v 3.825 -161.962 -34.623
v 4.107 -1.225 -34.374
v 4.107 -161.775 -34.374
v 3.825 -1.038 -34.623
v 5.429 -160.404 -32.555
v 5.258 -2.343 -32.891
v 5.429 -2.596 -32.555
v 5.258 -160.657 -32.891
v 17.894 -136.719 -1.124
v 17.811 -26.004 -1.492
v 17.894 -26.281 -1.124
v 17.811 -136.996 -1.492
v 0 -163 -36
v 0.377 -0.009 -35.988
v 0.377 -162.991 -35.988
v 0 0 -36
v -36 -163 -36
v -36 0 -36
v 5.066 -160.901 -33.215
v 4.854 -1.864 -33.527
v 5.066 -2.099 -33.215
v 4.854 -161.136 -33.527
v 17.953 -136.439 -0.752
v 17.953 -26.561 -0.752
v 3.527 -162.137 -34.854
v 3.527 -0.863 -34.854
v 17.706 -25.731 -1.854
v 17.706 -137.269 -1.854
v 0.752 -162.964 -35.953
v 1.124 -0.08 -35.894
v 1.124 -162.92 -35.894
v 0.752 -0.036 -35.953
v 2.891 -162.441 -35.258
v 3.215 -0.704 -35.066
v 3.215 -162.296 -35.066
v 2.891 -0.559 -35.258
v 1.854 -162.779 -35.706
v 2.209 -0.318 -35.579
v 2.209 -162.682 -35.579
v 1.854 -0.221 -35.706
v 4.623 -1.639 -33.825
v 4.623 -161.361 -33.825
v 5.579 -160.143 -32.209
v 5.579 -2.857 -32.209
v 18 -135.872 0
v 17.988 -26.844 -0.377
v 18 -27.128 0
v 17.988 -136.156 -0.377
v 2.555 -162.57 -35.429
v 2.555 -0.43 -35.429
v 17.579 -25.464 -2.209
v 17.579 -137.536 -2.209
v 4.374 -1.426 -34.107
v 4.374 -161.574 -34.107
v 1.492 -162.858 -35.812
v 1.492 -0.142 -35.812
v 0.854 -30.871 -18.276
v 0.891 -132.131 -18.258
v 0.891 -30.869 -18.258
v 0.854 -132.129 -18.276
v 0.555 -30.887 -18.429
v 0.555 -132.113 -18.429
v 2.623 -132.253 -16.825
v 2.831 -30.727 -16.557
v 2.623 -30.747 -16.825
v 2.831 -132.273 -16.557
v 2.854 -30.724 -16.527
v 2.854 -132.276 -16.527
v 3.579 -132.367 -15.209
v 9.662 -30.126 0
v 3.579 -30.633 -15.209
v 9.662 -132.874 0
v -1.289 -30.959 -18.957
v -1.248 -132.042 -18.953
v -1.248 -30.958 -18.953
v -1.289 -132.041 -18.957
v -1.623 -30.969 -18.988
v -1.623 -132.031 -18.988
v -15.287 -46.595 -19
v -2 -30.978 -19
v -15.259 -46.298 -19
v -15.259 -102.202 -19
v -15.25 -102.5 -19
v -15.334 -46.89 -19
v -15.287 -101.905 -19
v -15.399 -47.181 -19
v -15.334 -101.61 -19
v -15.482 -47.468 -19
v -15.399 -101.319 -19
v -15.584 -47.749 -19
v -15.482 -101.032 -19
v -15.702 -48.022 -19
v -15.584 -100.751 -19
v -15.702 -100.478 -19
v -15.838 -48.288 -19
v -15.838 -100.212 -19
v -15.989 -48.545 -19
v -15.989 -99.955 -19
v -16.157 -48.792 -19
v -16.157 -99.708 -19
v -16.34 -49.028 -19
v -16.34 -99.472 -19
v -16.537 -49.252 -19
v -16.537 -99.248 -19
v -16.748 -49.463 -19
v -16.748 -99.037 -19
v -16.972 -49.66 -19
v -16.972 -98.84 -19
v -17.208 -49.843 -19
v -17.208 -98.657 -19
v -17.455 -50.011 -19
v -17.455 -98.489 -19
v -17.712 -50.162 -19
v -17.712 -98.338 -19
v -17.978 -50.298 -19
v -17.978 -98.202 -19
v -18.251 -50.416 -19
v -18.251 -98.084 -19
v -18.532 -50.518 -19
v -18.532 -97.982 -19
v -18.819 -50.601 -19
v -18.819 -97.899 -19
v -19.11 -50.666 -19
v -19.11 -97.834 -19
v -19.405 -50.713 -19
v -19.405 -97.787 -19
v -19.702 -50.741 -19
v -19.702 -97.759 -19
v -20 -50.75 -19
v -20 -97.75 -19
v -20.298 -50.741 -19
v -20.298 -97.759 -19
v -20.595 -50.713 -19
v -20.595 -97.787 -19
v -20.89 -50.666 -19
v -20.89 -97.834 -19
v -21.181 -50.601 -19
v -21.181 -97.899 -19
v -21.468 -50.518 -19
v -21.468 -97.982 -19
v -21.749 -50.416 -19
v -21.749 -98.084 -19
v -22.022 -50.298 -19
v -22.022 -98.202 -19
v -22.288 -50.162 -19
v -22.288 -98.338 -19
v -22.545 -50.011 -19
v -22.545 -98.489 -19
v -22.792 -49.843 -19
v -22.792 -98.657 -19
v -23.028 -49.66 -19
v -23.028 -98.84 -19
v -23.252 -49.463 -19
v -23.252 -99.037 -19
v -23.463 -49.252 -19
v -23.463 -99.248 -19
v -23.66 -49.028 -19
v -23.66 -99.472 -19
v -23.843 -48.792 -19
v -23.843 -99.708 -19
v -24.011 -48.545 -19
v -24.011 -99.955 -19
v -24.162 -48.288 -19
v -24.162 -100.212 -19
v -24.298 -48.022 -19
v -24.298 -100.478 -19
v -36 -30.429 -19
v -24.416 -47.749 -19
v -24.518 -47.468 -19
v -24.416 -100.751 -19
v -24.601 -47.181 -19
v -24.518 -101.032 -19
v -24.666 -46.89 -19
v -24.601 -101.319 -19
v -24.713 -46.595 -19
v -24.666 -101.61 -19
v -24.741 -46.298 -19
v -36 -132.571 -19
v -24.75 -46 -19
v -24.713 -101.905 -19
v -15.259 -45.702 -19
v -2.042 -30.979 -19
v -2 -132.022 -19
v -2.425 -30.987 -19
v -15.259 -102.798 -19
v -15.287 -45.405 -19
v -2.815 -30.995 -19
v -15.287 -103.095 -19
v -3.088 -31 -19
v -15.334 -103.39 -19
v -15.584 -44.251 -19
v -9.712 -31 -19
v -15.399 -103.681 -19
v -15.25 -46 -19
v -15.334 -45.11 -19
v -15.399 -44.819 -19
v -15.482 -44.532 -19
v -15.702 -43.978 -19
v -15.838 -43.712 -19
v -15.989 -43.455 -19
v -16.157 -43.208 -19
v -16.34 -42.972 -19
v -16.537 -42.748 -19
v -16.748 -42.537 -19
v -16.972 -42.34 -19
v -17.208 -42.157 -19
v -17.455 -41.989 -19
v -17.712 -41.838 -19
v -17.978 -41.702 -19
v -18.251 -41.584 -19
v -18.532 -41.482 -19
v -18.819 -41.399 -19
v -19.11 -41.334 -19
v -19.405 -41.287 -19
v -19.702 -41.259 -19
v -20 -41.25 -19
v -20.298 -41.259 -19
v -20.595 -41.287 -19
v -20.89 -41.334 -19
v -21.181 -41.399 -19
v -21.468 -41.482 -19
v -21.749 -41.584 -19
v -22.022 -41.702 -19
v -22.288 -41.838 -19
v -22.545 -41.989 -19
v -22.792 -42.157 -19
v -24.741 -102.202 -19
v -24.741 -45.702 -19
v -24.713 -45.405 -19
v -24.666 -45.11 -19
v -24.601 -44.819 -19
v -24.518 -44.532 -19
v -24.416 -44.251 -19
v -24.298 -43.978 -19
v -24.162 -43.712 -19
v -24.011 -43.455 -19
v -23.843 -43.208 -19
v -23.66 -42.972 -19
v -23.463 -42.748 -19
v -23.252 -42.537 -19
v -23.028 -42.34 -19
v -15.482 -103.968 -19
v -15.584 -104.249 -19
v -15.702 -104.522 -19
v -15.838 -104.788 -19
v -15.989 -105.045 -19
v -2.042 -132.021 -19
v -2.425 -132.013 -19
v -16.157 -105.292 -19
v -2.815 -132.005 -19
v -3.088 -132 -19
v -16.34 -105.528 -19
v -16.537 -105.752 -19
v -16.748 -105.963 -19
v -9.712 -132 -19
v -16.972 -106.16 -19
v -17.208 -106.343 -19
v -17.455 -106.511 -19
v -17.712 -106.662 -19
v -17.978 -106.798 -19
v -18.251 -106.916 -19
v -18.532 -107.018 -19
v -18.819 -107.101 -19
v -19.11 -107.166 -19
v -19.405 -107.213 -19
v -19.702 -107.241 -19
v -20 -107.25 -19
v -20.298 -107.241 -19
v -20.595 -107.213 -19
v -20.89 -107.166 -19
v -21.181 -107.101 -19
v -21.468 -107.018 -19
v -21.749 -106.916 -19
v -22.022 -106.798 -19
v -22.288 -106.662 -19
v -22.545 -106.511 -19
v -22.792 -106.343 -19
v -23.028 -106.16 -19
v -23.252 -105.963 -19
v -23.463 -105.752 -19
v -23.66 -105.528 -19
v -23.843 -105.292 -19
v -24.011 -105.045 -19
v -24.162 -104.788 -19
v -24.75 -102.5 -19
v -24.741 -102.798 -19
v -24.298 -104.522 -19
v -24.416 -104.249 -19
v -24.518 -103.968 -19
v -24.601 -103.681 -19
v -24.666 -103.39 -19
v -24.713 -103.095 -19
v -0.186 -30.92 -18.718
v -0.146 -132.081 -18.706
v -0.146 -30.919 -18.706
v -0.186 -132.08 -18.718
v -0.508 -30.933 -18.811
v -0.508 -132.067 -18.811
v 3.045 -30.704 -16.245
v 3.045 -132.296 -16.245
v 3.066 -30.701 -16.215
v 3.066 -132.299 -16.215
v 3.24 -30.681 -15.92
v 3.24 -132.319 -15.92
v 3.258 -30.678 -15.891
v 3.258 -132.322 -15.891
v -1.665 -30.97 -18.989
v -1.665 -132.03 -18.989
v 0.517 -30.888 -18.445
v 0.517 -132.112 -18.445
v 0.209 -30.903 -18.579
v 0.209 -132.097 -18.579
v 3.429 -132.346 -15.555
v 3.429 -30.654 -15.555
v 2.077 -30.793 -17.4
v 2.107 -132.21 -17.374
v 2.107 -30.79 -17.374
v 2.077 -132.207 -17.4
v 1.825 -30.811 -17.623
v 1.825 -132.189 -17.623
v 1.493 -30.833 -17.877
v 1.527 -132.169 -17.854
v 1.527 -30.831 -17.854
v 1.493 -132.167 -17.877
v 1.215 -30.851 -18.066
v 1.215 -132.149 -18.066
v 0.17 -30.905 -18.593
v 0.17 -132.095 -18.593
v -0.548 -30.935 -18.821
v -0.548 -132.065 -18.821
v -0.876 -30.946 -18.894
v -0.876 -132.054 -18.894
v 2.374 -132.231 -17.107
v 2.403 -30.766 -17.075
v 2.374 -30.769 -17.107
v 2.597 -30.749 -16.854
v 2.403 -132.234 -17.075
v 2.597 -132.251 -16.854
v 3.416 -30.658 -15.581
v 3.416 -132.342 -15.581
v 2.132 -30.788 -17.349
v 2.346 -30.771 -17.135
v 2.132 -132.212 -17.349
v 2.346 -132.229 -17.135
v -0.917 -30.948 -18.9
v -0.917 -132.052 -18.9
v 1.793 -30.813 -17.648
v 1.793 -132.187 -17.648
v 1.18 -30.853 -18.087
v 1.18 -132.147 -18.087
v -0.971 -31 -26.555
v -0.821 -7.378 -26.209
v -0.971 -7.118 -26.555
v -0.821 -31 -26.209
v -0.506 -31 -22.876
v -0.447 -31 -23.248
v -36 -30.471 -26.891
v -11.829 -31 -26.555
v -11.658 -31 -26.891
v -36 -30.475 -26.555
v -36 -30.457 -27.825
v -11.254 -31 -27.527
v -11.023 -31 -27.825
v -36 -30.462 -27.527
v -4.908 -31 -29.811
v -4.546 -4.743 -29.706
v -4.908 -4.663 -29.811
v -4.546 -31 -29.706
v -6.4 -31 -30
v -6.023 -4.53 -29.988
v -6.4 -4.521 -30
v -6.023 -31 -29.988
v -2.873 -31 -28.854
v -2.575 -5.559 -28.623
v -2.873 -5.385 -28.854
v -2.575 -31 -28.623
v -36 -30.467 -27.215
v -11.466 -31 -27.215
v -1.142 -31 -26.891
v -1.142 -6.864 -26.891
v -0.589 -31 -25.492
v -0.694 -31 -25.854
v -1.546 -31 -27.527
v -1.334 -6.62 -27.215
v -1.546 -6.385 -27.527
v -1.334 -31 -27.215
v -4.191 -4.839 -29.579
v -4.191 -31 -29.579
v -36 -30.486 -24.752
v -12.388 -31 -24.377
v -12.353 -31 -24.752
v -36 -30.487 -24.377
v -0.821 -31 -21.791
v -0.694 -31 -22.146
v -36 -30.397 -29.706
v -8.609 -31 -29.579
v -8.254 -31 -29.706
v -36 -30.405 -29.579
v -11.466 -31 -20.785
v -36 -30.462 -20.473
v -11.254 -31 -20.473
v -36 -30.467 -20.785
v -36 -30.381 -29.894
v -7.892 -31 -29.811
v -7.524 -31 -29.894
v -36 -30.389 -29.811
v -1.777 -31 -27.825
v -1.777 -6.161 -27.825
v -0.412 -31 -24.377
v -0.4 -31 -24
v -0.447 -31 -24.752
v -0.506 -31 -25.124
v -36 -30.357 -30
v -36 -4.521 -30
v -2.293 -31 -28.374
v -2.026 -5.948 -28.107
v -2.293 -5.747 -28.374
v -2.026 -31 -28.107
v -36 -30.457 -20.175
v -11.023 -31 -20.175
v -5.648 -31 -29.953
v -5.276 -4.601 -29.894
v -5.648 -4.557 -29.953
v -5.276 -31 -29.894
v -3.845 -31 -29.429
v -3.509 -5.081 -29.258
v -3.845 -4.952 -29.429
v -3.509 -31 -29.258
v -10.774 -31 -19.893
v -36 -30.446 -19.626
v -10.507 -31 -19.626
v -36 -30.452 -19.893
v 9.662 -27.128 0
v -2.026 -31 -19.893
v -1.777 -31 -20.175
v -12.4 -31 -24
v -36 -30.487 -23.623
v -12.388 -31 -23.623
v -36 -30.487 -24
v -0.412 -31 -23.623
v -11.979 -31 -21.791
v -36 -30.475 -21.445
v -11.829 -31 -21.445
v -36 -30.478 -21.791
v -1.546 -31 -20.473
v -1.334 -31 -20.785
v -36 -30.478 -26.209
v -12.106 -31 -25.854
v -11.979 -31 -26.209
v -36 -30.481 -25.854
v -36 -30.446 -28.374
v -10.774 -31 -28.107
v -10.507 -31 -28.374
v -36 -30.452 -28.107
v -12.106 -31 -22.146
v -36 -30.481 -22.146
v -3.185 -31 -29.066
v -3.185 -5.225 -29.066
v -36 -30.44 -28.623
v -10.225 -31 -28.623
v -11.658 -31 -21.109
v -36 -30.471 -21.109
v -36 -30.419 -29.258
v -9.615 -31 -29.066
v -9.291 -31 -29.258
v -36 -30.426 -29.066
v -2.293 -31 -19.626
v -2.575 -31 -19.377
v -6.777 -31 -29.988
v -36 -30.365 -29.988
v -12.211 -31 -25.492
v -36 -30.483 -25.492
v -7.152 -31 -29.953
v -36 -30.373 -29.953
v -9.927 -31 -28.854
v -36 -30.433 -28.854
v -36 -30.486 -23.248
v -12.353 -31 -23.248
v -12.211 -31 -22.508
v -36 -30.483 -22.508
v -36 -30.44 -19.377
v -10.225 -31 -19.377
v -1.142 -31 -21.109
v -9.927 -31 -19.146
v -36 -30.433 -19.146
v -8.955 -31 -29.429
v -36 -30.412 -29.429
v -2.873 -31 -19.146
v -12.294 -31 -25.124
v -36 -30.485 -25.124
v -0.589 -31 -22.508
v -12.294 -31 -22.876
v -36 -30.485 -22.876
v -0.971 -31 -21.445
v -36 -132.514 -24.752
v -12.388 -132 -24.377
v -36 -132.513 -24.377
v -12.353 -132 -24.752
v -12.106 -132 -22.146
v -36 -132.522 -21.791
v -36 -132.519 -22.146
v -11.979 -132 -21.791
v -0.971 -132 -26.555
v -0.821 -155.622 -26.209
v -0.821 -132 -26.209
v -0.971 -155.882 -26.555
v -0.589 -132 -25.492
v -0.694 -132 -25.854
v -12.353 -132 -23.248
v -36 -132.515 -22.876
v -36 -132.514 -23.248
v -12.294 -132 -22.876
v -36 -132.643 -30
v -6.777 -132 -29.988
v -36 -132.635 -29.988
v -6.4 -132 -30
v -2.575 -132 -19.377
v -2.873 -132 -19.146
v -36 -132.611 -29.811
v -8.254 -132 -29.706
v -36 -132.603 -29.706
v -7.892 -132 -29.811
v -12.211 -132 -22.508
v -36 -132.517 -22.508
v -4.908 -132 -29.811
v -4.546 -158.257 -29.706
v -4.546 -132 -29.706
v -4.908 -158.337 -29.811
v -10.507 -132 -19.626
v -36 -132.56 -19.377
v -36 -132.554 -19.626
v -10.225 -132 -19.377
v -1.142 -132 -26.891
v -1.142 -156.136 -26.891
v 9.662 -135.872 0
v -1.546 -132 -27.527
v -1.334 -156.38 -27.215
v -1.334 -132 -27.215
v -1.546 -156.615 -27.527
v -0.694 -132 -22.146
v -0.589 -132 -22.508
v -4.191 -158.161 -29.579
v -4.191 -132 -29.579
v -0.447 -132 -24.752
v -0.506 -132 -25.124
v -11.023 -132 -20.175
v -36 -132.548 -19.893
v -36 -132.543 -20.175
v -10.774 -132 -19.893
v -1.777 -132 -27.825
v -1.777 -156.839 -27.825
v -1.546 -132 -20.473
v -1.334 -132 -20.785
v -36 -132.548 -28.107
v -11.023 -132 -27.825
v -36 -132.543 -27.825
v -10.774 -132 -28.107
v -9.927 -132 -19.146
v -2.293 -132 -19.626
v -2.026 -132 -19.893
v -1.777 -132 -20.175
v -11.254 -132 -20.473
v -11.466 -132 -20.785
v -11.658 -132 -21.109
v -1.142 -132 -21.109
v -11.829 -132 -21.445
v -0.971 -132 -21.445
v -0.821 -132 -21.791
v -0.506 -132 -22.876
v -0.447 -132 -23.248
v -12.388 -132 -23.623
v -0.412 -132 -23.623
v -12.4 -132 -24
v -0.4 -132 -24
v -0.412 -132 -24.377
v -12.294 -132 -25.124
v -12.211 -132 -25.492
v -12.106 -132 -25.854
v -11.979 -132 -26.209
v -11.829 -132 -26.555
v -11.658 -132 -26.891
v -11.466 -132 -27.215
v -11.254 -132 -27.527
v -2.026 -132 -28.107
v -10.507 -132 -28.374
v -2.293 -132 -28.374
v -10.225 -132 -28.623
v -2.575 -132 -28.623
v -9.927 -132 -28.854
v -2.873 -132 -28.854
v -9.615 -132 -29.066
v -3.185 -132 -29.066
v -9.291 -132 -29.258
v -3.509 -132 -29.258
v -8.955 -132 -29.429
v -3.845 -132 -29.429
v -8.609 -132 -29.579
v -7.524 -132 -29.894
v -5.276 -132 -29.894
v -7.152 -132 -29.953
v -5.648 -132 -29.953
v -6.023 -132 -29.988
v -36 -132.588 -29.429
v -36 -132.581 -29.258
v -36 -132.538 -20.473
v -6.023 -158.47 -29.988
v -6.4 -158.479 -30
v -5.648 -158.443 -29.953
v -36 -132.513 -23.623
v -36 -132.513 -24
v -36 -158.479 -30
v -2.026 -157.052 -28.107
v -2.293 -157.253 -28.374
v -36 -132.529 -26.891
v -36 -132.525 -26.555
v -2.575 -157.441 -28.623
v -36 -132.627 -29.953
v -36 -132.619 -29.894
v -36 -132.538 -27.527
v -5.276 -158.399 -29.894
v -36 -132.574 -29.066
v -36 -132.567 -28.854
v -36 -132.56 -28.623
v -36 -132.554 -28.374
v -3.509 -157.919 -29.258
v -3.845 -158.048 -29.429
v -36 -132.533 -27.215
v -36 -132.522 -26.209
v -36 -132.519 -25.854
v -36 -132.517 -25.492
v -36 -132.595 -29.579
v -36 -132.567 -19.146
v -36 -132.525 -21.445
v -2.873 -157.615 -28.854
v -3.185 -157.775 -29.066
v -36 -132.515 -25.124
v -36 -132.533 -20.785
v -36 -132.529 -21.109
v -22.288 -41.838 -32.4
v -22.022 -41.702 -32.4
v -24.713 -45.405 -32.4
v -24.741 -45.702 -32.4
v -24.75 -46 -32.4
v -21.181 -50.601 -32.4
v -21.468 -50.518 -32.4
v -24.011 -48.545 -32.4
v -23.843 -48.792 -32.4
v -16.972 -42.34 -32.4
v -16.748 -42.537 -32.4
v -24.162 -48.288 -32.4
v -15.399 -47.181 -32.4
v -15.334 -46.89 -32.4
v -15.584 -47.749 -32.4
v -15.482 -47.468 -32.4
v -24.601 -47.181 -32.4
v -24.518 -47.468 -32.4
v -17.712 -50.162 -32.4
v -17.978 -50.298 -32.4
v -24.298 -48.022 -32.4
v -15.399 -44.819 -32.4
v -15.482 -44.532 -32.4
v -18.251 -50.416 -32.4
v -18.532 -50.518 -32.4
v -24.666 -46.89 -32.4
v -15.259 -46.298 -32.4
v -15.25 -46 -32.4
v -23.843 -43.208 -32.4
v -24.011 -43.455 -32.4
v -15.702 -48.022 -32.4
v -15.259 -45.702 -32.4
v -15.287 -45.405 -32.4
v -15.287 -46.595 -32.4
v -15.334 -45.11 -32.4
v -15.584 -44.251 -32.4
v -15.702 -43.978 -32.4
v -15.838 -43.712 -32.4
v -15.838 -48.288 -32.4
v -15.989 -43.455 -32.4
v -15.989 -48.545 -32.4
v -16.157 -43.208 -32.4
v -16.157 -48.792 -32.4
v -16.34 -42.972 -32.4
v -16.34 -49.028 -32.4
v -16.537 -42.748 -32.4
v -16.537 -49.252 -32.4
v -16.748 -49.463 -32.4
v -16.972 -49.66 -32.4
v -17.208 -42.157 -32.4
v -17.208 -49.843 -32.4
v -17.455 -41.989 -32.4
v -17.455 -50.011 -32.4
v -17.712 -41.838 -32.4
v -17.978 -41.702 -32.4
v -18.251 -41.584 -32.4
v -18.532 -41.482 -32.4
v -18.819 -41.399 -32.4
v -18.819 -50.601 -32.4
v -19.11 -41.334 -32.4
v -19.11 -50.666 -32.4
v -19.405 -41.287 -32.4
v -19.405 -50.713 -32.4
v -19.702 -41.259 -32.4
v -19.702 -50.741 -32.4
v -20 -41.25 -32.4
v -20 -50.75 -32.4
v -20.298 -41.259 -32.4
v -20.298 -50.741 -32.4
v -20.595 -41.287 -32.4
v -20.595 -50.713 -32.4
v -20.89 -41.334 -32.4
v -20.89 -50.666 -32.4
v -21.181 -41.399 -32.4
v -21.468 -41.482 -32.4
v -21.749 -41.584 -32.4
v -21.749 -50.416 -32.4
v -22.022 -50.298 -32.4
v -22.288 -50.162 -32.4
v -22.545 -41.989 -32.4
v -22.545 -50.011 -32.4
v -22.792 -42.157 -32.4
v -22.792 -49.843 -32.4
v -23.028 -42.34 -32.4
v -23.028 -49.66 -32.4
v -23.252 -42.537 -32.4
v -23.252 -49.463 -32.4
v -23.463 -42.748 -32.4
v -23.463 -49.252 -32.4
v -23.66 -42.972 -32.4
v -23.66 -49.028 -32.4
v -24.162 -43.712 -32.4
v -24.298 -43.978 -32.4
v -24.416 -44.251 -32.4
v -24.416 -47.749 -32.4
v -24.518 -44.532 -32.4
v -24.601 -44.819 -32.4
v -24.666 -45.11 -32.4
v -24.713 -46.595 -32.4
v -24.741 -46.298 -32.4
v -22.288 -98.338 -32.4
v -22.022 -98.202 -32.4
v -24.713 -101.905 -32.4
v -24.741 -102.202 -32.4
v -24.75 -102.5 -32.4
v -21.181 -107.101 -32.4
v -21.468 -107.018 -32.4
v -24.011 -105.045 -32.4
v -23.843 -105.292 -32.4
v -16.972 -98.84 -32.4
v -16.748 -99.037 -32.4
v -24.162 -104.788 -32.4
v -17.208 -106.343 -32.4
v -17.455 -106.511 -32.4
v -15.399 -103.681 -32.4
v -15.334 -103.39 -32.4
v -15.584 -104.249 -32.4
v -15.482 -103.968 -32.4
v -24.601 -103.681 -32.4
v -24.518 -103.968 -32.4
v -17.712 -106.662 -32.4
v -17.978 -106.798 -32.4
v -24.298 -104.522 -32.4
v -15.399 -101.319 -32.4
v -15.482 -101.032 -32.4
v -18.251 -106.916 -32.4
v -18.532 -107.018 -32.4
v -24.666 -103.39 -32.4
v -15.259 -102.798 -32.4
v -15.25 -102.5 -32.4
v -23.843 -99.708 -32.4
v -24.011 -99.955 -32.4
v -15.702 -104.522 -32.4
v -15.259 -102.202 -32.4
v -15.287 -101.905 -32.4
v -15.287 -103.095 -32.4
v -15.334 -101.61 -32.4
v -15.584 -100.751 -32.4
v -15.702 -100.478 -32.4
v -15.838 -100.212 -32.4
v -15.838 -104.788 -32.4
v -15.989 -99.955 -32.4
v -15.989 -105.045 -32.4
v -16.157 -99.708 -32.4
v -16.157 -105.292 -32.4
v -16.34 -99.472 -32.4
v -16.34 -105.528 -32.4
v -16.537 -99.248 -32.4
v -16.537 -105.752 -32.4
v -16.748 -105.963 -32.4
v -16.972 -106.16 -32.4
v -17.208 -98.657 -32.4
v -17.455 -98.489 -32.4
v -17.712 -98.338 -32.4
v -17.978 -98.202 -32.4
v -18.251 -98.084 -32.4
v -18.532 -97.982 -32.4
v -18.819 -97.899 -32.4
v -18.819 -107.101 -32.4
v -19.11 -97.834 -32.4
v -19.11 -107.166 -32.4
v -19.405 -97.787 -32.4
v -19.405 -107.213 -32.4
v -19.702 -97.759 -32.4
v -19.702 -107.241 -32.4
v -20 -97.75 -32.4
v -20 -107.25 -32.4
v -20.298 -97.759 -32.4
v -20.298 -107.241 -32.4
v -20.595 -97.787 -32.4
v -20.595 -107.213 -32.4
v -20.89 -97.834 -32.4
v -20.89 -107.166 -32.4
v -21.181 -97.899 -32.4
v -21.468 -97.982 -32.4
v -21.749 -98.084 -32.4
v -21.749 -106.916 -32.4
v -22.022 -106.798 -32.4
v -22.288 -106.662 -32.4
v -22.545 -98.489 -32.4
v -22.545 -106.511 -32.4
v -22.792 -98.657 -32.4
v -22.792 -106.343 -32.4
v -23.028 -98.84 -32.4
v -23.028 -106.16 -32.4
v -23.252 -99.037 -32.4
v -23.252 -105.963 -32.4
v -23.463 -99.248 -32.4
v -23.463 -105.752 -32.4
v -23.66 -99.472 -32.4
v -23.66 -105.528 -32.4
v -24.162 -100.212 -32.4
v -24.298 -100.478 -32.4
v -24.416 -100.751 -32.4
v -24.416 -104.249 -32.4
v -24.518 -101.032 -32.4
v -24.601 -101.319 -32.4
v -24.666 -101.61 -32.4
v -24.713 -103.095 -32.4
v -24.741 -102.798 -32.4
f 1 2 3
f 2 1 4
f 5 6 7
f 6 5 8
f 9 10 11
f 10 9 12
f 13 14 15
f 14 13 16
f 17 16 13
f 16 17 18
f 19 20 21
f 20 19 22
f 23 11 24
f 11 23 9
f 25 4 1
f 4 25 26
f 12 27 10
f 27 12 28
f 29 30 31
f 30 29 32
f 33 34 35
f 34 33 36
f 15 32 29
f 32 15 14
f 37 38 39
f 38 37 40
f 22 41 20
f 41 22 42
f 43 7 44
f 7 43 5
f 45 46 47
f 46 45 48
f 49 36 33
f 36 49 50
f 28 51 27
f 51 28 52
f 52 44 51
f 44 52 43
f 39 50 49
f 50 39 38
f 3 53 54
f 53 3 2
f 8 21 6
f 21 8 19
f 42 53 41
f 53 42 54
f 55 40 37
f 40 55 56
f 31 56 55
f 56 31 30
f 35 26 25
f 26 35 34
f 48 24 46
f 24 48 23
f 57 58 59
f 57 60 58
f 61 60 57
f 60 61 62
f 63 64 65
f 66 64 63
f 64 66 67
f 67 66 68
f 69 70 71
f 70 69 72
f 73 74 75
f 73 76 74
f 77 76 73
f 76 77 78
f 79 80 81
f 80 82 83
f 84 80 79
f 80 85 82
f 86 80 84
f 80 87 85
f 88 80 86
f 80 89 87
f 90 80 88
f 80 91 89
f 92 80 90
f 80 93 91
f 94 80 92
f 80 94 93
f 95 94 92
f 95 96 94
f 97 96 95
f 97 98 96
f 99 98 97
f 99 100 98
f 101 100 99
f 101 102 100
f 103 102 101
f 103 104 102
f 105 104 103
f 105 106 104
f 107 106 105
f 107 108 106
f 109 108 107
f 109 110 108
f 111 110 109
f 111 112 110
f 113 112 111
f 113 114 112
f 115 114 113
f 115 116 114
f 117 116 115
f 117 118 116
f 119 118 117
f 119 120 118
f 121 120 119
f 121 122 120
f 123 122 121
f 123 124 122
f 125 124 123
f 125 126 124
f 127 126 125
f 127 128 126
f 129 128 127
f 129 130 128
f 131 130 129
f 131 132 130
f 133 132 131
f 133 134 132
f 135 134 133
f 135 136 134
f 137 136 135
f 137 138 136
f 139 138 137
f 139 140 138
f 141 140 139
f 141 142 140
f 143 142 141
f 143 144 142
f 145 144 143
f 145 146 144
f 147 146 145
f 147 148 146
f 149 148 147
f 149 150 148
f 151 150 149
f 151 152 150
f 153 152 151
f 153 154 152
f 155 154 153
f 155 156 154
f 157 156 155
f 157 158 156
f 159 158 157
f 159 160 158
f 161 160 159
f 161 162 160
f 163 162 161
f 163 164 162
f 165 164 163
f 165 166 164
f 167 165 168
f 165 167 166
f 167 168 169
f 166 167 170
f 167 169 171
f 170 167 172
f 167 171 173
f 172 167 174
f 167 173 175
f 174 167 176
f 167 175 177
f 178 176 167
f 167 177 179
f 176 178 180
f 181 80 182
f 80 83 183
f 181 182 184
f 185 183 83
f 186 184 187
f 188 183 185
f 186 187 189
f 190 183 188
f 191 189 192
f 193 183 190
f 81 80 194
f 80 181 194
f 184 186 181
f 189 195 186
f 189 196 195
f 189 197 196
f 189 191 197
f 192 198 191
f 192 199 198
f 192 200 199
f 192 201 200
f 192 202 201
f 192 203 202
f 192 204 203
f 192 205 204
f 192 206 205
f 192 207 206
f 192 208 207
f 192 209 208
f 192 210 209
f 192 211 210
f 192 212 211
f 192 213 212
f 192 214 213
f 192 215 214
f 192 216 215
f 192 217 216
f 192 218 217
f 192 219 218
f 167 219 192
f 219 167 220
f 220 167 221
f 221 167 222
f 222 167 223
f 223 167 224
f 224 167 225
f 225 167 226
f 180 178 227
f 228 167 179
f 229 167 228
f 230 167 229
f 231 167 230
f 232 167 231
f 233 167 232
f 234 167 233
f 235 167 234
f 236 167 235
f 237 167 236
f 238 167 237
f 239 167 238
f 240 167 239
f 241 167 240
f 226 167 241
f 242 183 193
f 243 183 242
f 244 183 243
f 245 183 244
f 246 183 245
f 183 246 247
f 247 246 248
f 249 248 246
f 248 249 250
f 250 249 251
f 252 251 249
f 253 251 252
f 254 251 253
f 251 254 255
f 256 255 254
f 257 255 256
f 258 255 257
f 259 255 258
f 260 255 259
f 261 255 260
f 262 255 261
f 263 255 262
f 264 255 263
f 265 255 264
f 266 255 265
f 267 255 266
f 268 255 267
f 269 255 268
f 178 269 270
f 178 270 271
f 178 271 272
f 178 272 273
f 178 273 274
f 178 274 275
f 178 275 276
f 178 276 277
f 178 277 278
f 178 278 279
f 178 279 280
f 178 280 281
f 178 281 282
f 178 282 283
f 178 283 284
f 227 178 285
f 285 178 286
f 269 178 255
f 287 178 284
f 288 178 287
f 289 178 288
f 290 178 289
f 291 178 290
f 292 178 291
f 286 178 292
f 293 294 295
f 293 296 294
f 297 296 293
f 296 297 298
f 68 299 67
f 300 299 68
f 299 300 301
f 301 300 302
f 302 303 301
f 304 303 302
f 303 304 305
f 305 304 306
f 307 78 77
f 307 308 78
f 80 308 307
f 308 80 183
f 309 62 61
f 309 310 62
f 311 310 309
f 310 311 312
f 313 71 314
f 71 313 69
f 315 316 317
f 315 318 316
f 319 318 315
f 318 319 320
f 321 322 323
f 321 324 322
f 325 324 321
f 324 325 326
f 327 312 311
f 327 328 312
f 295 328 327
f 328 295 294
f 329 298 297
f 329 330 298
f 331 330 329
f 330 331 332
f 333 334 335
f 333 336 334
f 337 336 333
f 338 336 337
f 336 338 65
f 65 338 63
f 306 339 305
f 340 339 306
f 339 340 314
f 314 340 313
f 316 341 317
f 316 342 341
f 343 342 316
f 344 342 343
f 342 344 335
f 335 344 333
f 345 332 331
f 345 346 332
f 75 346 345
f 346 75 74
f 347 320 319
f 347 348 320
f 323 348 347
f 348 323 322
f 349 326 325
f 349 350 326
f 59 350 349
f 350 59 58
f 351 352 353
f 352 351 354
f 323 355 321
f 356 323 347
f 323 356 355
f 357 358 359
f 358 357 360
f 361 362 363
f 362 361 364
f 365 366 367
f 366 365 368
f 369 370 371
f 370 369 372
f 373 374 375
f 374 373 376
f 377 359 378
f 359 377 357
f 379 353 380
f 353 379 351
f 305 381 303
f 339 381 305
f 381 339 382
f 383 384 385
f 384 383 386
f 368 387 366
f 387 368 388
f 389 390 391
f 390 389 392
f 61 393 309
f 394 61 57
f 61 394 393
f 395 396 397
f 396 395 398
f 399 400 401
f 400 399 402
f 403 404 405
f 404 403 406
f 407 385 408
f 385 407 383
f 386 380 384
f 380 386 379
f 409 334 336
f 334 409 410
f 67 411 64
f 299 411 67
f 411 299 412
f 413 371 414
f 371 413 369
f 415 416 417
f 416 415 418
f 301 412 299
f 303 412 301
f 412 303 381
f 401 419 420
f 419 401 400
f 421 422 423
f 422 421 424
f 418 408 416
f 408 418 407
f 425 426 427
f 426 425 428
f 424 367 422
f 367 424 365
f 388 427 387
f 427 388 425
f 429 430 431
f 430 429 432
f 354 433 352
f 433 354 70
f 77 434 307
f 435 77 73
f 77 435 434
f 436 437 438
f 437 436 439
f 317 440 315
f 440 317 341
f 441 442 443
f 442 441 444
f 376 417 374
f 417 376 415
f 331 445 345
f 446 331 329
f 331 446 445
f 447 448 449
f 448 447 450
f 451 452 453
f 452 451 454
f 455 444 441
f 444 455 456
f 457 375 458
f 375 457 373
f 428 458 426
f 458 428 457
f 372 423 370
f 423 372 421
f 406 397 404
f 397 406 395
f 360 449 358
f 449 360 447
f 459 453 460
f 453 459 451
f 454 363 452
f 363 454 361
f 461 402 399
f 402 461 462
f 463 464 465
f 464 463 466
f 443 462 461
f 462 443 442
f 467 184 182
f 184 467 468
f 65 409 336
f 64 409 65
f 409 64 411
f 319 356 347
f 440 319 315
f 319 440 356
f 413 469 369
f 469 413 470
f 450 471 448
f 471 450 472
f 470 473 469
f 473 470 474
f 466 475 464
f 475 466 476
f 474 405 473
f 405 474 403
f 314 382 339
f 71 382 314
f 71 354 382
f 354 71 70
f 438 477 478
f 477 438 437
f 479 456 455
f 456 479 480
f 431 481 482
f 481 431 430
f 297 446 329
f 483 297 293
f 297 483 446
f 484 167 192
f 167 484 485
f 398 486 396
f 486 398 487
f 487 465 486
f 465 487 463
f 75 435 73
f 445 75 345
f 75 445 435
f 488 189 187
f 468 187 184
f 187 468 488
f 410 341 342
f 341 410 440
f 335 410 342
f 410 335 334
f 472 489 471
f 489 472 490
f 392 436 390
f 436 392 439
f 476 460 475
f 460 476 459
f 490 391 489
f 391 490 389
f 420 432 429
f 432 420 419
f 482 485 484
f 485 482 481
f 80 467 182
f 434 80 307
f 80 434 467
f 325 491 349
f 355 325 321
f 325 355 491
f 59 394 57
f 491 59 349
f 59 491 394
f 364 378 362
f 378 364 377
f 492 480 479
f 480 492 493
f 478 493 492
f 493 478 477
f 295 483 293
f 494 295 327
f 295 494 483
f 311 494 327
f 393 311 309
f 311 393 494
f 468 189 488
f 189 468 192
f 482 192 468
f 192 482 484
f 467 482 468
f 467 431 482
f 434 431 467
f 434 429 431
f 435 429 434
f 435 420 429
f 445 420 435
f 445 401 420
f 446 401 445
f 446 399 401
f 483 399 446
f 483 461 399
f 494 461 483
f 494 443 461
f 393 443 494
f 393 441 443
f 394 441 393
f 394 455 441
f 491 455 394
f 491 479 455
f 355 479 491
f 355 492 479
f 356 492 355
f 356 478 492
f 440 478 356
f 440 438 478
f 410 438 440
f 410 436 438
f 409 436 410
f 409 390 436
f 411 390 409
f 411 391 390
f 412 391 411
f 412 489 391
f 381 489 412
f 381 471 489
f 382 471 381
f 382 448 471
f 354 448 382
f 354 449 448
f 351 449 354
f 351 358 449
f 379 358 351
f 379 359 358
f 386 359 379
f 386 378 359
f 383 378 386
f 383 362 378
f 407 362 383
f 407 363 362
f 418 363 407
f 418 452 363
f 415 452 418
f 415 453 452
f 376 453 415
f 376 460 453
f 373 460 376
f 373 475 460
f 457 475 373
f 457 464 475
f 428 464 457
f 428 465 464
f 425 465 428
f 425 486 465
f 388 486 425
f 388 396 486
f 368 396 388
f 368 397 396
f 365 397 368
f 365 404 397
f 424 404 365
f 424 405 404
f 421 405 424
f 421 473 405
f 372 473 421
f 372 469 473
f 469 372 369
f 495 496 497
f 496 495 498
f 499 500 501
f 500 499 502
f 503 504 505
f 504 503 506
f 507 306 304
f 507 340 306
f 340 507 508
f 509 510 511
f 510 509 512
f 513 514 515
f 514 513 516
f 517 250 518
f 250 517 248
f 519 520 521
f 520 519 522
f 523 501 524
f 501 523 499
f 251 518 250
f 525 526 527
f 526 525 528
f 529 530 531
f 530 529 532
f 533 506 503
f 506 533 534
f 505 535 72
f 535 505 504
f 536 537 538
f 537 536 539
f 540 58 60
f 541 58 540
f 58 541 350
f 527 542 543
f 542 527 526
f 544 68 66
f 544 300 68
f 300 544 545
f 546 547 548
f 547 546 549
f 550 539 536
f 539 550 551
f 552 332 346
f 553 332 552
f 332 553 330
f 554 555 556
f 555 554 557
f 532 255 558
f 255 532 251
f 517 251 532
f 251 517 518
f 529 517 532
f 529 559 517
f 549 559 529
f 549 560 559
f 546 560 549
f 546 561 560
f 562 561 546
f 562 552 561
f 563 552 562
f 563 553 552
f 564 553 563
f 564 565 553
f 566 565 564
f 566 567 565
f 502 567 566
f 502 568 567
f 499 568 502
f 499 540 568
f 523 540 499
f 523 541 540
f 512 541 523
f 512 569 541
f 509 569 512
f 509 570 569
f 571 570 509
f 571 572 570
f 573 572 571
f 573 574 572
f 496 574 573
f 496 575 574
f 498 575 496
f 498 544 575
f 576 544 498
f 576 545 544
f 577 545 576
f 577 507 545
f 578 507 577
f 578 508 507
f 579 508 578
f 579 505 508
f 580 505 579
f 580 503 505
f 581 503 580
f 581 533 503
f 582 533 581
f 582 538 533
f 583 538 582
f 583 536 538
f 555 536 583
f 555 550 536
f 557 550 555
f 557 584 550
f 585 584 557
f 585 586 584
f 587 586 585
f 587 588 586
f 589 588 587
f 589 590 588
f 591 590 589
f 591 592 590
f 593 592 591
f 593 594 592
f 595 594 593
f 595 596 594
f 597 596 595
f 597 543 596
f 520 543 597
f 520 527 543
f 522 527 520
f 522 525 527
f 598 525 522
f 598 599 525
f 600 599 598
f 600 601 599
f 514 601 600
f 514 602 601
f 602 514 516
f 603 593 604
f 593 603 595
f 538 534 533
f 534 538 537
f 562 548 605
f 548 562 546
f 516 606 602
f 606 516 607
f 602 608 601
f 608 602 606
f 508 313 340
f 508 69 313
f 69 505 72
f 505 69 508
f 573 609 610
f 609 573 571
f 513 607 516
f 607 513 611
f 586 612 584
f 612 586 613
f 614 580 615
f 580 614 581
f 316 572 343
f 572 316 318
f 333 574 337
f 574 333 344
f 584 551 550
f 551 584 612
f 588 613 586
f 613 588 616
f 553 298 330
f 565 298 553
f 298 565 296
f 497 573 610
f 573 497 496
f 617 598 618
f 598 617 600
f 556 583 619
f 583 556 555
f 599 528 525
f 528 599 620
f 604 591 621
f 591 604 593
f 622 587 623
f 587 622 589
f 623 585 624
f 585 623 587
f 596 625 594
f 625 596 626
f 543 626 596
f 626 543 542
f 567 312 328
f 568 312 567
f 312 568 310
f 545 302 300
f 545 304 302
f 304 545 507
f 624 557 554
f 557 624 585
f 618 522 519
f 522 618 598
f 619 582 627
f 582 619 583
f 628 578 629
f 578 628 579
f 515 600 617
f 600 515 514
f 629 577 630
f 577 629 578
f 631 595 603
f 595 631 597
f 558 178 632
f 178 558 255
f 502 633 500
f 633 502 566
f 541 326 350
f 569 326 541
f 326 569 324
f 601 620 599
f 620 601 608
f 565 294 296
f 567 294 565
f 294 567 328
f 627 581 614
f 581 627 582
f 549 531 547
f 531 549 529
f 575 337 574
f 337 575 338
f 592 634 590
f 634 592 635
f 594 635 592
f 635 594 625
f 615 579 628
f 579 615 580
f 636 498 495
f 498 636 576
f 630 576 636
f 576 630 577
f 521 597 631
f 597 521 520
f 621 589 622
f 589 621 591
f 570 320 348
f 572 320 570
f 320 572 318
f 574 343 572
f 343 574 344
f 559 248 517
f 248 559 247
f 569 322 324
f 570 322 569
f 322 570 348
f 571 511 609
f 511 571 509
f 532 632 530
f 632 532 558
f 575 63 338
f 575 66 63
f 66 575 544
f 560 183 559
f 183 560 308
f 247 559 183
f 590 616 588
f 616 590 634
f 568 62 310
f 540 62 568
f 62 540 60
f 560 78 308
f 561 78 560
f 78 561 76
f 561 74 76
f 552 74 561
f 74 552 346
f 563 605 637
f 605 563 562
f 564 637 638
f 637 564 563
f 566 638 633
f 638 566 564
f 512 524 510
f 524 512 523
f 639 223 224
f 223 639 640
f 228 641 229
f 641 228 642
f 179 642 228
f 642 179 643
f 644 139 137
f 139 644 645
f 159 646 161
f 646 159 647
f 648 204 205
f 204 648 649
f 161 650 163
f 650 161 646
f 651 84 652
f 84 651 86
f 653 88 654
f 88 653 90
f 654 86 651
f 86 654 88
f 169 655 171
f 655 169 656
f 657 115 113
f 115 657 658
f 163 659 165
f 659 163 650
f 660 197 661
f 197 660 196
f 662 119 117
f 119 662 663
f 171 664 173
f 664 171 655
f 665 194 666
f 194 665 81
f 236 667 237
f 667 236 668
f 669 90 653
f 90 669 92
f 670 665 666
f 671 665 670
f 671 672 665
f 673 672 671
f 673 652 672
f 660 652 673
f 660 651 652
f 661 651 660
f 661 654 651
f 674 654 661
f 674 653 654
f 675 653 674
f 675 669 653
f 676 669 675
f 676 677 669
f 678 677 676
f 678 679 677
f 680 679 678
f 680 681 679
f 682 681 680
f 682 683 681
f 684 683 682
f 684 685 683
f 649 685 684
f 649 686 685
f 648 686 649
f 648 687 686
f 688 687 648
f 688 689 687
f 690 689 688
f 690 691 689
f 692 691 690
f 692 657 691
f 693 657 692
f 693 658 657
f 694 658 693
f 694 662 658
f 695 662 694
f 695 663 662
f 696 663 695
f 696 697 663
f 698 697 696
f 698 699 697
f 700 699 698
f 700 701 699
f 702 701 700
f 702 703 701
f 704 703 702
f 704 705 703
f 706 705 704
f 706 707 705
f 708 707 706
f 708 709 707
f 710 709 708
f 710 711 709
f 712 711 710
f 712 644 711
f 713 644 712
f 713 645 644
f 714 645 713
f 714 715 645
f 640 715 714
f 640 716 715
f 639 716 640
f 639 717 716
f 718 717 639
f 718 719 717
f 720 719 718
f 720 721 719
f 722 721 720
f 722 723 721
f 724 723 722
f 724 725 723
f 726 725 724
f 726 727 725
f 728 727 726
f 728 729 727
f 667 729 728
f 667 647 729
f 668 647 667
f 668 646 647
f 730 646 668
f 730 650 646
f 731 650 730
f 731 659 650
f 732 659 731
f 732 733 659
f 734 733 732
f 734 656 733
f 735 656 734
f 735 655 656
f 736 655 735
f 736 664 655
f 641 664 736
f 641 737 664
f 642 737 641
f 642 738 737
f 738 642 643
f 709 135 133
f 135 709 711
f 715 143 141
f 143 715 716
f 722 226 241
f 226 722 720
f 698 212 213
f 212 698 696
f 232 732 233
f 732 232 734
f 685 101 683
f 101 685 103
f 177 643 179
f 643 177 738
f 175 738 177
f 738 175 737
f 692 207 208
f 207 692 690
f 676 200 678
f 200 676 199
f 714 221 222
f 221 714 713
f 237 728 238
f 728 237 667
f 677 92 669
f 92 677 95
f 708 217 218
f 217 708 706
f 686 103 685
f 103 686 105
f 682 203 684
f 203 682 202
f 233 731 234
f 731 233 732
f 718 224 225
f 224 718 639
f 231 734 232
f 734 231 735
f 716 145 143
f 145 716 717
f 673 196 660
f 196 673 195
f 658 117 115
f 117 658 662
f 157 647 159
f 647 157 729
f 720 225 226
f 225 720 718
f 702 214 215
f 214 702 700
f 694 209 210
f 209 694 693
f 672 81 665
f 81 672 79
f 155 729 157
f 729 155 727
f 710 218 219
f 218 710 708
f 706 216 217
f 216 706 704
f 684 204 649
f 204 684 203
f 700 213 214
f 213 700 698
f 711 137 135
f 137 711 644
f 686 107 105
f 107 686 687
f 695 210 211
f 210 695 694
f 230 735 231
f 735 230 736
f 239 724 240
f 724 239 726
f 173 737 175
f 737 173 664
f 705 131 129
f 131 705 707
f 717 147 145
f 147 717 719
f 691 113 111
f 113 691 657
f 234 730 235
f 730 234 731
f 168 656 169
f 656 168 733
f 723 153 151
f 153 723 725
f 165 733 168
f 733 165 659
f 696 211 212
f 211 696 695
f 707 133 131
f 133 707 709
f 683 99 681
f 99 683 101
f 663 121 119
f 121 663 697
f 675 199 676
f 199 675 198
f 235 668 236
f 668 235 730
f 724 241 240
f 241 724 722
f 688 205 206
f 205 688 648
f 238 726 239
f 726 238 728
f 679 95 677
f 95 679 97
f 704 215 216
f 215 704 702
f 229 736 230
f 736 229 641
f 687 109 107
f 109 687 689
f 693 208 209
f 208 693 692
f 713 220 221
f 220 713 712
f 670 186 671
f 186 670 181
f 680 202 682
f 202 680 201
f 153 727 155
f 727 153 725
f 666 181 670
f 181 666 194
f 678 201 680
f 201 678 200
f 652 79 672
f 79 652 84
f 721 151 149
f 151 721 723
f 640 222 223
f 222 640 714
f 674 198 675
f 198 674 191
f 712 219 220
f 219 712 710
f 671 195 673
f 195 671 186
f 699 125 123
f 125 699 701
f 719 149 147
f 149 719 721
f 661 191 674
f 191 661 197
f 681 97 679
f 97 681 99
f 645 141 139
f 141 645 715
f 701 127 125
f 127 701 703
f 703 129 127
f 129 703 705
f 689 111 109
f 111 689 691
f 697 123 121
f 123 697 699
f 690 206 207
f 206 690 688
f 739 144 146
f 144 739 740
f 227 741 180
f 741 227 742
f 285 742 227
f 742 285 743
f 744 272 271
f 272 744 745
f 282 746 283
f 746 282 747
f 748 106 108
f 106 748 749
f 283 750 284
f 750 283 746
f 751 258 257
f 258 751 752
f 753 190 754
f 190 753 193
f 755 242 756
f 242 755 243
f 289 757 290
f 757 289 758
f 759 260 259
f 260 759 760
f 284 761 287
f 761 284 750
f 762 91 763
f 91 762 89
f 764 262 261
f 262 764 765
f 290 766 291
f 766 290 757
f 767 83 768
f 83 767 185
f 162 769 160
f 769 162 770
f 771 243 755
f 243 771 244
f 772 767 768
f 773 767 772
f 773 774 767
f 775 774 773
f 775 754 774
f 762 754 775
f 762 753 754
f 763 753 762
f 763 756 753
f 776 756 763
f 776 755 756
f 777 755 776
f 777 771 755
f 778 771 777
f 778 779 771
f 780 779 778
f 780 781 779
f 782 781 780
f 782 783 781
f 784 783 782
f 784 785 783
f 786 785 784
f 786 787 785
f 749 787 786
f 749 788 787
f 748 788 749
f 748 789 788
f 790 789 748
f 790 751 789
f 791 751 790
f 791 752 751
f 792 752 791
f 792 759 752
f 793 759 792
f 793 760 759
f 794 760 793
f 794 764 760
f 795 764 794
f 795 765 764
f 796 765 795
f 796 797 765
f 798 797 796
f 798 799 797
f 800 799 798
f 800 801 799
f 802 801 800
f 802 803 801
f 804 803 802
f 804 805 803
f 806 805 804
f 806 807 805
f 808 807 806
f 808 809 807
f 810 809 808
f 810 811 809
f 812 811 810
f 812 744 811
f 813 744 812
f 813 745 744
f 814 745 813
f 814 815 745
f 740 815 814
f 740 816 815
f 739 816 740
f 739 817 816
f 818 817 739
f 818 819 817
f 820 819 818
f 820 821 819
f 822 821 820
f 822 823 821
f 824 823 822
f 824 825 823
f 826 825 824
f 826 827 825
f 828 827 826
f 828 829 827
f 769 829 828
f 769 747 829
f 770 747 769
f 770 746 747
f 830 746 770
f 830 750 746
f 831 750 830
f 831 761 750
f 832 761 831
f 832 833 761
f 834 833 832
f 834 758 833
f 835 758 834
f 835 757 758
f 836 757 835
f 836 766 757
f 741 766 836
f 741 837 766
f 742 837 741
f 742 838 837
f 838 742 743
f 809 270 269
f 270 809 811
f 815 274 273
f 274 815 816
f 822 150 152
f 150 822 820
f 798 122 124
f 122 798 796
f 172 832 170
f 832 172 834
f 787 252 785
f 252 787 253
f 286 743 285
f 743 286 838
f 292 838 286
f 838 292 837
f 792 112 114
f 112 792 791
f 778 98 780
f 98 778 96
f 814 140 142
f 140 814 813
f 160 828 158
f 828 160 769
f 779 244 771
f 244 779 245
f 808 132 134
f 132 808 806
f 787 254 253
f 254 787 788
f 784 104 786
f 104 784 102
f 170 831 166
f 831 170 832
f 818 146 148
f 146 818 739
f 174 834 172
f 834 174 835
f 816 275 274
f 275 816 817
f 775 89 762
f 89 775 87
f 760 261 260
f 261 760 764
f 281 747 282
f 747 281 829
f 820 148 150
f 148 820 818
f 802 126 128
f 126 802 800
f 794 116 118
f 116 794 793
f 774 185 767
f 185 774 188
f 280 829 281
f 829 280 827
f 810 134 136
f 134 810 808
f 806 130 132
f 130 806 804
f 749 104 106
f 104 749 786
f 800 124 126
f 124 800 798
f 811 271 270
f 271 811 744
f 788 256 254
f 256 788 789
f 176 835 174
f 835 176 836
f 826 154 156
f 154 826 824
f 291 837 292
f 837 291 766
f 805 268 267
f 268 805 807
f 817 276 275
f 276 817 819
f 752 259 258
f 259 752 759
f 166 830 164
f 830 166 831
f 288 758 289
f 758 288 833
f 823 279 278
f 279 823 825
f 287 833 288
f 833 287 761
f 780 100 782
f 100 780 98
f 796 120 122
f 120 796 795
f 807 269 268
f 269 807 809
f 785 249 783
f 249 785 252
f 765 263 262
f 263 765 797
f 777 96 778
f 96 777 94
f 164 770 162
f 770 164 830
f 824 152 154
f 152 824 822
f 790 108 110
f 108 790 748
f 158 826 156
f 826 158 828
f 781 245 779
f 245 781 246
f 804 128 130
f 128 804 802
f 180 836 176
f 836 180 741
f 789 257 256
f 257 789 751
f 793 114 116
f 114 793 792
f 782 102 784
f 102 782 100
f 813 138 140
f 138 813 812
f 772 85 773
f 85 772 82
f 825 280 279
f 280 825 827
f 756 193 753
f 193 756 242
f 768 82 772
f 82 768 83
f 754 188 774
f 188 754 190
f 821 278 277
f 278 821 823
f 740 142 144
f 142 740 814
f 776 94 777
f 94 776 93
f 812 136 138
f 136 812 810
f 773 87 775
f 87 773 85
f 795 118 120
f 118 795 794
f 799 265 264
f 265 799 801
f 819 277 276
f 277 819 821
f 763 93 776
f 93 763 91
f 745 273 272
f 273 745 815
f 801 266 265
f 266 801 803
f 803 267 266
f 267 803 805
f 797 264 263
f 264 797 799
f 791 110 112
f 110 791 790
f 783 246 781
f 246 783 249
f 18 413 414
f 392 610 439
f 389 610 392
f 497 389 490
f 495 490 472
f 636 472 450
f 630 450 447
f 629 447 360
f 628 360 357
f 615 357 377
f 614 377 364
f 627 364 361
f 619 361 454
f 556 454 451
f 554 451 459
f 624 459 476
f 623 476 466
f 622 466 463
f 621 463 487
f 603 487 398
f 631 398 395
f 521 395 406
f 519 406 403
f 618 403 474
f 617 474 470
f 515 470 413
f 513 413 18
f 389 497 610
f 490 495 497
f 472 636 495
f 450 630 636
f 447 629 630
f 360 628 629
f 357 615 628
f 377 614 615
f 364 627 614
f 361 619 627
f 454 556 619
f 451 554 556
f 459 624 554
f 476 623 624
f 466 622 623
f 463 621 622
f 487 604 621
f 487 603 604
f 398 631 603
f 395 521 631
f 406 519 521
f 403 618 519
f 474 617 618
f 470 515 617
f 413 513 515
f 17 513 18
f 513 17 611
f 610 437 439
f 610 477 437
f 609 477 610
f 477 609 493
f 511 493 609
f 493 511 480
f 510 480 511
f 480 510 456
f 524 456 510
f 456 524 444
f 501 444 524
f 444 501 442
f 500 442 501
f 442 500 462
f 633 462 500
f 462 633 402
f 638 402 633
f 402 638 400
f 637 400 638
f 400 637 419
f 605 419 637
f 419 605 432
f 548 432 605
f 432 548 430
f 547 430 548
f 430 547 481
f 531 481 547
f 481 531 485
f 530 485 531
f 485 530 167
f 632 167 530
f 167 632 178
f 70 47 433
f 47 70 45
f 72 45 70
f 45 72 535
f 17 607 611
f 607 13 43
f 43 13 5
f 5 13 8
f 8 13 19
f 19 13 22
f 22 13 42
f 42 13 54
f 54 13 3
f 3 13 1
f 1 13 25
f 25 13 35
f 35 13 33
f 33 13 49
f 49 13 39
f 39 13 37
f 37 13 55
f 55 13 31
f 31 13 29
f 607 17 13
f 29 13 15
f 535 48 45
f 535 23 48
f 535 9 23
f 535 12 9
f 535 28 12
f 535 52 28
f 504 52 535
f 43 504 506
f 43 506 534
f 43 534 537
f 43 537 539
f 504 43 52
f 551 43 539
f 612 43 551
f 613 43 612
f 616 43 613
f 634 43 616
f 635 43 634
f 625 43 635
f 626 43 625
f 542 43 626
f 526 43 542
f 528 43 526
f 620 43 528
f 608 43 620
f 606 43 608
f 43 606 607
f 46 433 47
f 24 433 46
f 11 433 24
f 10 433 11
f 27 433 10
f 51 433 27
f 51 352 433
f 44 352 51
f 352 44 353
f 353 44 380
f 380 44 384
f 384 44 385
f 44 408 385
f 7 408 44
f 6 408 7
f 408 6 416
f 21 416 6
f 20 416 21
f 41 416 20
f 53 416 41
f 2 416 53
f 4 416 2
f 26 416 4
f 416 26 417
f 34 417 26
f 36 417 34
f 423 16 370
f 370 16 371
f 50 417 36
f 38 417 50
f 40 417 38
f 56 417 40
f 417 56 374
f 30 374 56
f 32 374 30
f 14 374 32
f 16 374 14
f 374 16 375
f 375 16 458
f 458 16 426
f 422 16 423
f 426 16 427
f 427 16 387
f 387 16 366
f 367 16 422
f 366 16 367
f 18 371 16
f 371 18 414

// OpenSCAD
$fn = 100;

widthTopCheek = 163; // y
widthBottomCheek = 114; // y
heightCheek = 30; // z
depthTopCheek = 36; // x
depthBottomCheek = 48; // x
boltSocketDepth = 13.5;
boltSocketDiameter = 9.5;
diameterRod = 12; // Halterungsstangen + Rundungen
radiusRod = 6;

rotate([0, 180, 0]) {   // preparing for printing (better this way)
    difference() {
        hull() {    // main block from which everything will be cut off/out
            translate([0, 0, heightCheek]) rotate([90, 0, 0]) cylinder(widthTopCheek, d = diameterRod);   // rounded corner (for the cheek)
            translate([-12, -((widthTopCheek - widthBottomCheek) / 2), 0]) rotate([90, 0, 0]) cylinder(widthBottomCheek, d = diameterRod);
            translate([36, -((widthTopCheek - widthBottomCheek) / 2), 0]) rotate([90, 0, 0]) cylinder(widthBottomCheek, d = diameterRod);
            translate([36, 0, heightCheek]) rotate([90, 0, 0]) cylinder(widthTopCheek, d = diameterRod);
        }
        translate([2, 0, -17]) hull() {
            translate([0, 1, heightCheek]) rotate([90, 0, 0]) cylinder(widthTopCheek + 2, d = diameterRod);
            translate([-12, -((widthTopCheek - widthBottomCheek) / 2), 0]) rotate([90, 0, 0]) cylinder(widthBottomCheek, d = diameterRod);
            translate([36, -((widthTopCheek - widthBottomCheek) / 2), 0]) rotate([90, 0, 0]) cylinder(widthBottomCheek, d = diameterRod);
            translate([46, 0, heightCheek]) rotate([90, 0, 0]) cylinder(widthTopCheek, d = diameterRod);
        }
        translate([6.4, widthTopCheek - 30, -6]) hull() {
            translate([0, 1, heightCheek]) rotate([90, 0, 0]) cylinder(widthTopCheek + 2, d = diameterRod);
            translate([-12, 0, 0]) rotate([90, 0, 0]) cylinder(widthTopCheek, d = diameterRod);
            translate([36, -((widthTopCheek - widthBottomCheek) / 2), 0]) rotate([90, 0, 0]) cylinder(widthBottomCheek, d = diameterRod);
            translate([46, 0, heightCheek]) rotate([90, 0, 0]) cylinder(widthTopCheek, d = diameterRod);
        }
        translate([6.4, -widthTopCheek + 30, -6]) hull() {
            translate([0, 1, heightCheek]) rotate([90, 0, 0]) cylinder(widthTopCheek + 2, d = diameterRod);
            translate([-12, 0, 0]) rotate([90, 0, 0]) cylinder(widthTopCheek, d = diameterRod);
            translate([36, -((widthTopCheek - widthBottomCheek) / 2), 0]) rotate([90, 0, 0]) cylinder(widthBottomCheek, d = diameterRod);
            translate([46, 0, heightCheek]) rotate([90, 0, 0]) cylinder(widthTopCheek, d = diameterRod);
        }
        translate([20, -46, 18.9]) cylinder(boltSocketDepth, d = boltSocketDiameter);
        translate([20, -102.5, 18.9]) cylinder(boltSocketDepth, d = boltSocketDiameter);
        translate([depthTopCheek,-(widthTopCheek + 1),15]) cube([10, widthTopCheek + 2, 30]);
        translate([-30,-(widthTopCheek + 1),0]) rotate([0, 90, 0]) cube([10, widthTopCheek + 2, 30]);
        translate([-20,-widthTopCheek, heightCheek + radiusRod]) rotate([127,0,0]) mirror([0,1,0]) cube([depthTopCheek * 1.8, heightCheek * 1.6, 10]);
        translate([-20,0, heightCheek + radiusRod]) rotate([-127,0,0]) cube([depthTopCheek * 1.8, heightCheek * 1.6, 10]);
    }
}

height = 74;  // z
width = 156;  // y
depth = 25.3; // x

//difference() {
//    difference() {
//        cube([depth, width, height]);
//        translate([(radiusRod + 11), (60 + radiusRod), -5]) cylinder(80, d = diameterRod);
//        translate([(radiusRod + 11), (89 + radiusRod), -5]) cylinder(80, d = diameterRod);
//    }
//
//    translate([0, 28, 30]) union(){
//        hull(){
//            translate([-3, 0, 0]) rotate([0, 90, 0]) cylinder(depth + 5, d = 6);
//            translate([-3, 80, 0]) rotate([0, 90, 0]) cylinder(depth + 5, d = 6);
//            translate([-3, -15, 23]) rotate([0, 90, 0]) cylinder(depth + 5, d = 6);
//            translate([-3, 105, 39]) rotate([0, 90, 0]) cylinder(depth + 5, d = 6);
//        }
//        hull(){
//            translate([-3, -12, 23]) rotate([0, 90, 0]) cylinder(depth + 5, d = 6);
//            translate([-3, -30, 23]) rotate([0, 90, 0]) cylinder(depth + 5, d = 6);
//            translate([-3, -30, 60]) rotate([0, 90, 0]) cylinder(depth + 5, d = 6);
//        }
//        hull(){
//            translate([-3, 102, 39]) rotate([0, 90, 0]) cylinder(depth + 5, d = 6);
//            translate([-3, 120, 39]) rotate([0, 90, 0]) cylinder(depth + 5, d = 6);
//            translate([-3, 128, 52]) rotate([0, 90, 0]) cylinder(depth + 5, d = 6);
//        }
//        hull(){
//            translate([-3, -12, 23]) rotate([0, 90, 0]) cylinder(depth + 5, d = 6);
//            translate([-3, -20, 43]) rotate([0, 90, 0]) cylinder(depth + 5, d = 6);
//            translate([-3, 122, 52]) rotate([0, 90, 0]) cylinder(depth + 5, d = 6);
//            translate([-3, 102, 39]) rotate([0, 90, 0]) cylinder(depth + 5, d = 6);
//        }
//    }
//}
